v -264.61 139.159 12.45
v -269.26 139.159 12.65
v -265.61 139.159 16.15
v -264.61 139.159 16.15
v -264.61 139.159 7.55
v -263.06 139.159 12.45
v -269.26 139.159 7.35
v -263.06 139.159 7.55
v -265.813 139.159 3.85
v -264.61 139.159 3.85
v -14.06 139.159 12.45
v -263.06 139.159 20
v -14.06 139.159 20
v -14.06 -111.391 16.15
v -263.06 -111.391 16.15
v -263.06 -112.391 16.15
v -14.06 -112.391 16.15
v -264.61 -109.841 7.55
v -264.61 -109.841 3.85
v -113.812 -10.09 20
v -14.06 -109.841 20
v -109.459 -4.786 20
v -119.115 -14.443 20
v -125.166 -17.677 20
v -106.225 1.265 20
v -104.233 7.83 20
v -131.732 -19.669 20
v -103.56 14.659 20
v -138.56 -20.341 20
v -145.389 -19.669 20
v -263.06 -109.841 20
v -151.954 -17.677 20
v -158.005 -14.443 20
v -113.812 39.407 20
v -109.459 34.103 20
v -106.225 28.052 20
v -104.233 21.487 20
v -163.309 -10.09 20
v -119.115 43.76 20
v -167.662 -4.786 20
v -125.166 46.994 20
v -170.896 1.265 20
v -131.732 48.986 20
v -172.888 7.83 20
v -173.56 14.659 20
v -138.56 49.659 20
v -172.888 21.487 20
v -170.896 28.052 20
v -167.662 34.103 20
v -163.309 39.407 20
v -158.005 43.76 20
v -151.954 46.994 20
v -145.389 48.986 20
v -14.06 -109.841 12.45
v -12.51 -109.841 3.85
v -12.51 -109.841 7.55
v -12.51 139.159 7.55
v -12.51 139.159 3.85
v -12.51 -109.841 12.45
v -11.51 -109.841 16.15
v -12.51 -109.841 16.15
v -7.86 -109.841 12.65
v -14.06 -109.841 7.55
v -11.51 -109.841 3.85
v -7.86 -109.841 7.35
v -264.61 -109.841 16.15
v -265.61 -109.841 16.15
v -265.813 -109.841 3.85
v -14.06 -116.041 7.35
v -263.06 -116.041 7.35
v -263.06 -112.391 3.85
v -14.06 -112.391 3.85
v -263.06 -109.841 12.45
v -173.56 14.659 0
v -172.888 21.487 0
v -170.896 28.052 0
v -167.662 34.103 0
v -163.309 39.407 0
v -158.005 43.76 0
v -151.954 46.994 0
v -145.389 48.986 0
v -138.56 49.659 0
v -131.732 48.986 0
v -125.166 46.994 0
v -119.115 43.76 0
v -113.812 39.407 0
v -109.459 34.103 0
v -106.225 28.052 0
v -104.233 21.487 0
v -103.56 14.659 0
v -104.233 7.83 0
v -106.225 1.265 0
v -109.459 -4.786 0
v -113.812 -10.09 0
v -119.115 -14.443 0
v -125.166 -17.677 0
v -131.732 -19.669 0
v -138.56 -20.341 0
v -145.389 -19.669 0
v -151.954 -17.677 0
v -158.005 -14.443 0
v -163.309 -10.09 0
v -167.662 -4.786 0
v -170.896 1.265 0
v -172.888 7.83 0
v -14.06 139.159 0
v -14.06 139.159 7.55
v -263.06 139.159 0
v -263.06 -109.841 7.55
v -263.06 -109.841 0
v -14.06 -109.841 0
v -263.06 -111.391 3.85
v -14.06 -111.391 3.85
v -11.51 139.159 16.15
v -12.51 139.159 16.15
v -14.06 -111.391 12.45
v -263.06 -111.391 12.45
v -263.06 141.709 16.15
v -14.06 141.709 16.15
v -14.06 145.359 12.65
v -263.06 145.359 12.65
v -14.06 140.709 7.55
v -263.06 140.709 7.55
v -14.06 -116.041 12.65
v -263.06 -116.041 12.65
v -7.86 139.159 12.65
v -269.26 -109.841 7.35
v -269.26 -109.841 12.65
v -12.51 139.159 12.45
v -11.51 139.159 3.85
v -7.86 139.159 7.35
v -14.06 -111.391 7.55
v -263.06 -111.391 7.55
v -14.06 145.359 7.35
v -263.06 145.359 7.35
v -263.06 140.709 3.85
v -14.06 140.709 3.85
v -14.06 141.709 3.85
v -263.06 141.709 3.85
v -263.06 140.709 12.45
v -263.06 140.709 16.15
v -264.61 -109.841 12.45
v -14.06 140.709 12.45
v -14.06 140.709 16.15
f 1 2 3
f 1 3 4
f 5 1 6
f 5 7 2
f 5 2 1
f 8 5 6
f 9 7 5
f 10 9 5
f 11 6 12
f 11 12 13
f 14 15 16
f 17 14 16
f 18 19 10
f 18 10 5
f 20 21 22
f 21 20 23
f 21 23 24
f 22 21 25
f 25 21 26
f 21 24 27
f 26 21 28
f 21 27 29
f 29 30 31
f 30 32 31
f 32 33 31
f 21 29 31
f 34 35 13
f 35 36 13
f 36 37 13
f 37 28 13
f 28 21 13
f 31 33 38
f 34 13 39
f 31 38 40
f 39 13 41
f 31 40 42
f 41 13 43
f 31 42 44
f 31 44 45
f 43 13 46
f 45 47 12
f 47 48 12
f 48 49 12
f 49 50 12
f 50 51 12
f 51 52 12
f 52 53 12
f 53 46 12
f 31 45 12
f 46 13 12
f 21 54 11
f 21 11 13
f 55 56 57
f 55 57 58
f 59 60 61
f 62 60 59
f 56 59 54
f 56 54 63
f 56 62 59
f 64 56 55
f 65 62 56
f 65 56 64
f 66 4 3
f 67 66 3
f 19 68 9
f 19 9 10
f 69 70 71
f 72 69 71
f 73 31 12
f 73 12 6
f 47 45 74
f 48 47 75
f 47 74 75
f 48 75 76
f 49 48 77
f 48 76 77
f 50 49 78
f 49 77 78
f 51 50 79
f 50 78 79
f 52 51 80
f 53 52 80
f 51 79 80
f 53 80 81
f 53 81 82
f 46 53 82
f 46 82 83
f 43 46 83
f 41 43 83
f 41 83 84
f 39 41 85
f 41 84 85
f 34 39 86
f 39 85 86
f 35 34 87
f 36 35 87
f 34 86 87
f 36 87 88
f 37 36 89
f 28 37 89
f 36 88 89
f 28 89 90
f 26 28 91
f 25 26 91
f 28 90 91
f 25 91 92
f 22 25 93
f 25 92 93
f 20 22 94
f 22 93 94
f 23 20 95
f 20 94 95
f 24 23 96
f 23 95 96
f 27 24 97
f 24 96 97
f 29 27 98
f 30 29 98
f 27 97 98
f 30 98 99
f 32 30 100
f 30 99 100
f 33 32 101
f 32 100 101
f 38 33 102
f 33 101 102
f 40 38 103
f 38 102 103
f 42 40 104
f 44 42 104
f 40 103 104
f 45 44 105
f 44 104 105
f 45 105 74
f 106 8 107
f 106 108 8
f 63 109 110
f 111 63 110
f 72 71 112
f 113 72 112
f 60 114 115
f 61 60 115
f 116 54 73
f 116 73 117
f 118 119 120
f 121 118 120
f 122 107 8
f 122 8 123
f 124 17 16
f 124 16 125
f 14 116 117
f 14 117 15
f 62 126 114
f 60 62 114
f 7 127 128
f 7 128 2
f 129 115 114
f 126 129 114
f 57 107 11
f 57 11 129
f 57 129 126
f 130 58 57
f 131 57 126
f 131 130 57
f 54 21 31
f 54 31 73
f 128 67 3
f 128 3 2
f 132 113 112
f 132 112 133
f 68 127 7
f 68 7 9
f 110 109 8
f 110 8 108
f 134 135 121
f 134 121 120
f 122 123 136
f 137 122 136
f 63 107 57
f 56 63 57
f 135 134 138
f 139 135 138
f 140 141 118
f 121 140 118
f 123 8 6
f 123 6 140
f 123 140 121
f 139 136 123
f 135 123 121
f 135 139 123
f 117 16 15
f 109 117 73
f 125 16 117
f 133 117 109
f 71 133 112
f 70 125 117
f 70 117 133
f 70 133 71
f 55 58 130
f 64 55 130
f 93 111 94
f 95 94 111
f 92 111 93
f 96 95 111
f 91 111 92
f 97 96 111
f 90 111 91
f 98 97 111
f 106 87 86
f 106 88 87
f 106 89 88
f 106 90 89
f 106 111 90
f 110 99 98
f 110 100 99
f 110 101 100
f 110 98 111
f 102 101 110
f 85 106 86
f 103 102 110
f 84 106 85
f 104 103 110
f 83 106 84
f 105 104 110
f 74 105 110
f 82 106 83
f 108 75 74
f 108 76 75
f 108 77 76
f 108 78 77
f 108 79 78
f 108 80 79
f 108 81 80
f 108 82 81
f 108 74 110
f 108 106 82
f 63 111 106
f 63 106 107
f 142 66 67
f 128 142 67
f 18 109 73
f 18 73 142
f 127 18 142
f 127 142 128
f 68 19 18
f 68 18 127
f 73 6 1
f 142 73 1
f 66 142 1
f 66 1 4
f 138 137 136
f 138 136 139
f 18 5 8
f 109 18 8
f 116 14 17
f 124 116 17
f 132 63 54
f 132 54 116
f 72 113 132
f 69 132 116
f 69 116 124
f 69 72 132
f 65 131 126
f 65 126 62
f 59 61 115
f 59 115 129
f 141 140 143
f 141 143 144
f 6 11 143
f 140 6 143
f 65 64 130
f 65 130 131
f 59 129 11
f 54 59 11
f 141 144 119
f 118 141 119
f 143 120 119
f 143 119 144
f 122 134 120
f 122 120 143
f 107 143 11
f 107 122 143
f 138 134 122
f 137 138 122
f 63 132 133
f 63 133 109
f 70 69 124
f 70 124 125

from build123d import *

# Parameters (mm, degrees)
BOSS_EXTRU_3_DEPTH            = 20
ENL_V_MAT_EXTRU_11_DEPTH      = 295.374154069
ENL_V_MAT_EXTRU_11_DEPTH_BACK = 249
ENL_V_MAT_EXTRU_12_DEPTH      = 295.374154069
ENL_V_MAT_EXTRU_12_DEPTH_BACK = 249
ENL_V_MAT_EXTRU_13_DEPTH      = 372.52143865
ENL_V_MAT_EXTRU_13_DEPTH_BACK = 249
ENL_V_MAT_EXTRU_14_DEPTH      = 372.52143865
ENL_V_MAT_EXTRU_14_DEPTH_BACK = 249
ENL_V_MAT_EXTRU_15_DEPTH      = 295.374154069
ENL_V_MAT_EXTRU_15_DEPTH_BACK = 249
ENL_V_MAT_EXTRU_16_DEPTH      = 295.374154069
ENL_V_MAT_EXTRU_16_DEPTH_BACK = 249
ENL_V_MAT_EXTRU_17_DEPTH      = 372.52143865
ENL_V_MAT_EXTRU_17_DEPTH_BACK = 249
ENL_V_MAT_EXTRU_18_DEPTH      = 372.52143865
ENL_V_MAT_EXTRU_18_DEPTH_BACK = 249
ESQUISSE17_R                  = 35
ENL_V_MAT_EXTRU_20_DEPTH      = 20


with BuildPart() as part:
    # Esquisse1 → Boss.-Extru.3 (new body)
    with BuildSketch(Plane.XY):
        Polygon((-263.060356118, 145.358531169), (-14.060356118, 145.358531169), (-14.060356118, 139.158531169), (-7.860356118, 139.158531169), (-7.860356118, -109.841468831), (-14.060356118, -109.841468831), (-14.060356118, -116.041468831), (-263.060356118, -116.041468831), (-263.060356118, -109.841468831), (-269.260356118, -109.841468831), (-269.260356118, 139.158531169), (-263.060356118, 139.158531169), align=None)
    extrude(amount=BOSS_EXTRU_3_DEPTH)

    # Esquisse4 → Enlèv. mat.-Extru.11 (cut, two sides: drawn at the far end of the back side and taken through both)
    with BuildSketch(Plane(origin=(-14.060356118, 0, 0), x_dir=(0, 0, -1), z_dir=(1, 0, 0)).offset(-ENL_V_MAT_EXTRU_11_DEPTH_BACK)):
        Polygon((-553.411816833, 139.158531169), (-20, 139.158531169), (-12.45, 139.158531169), (-12.45, 140.708531169), (-16.15, 140.708531169), (-16.15, 141.708531169), (-12.65, 145.358531169), (356.535030531, 530.365777294), (-64.826371106, 1510.451097334), (-974.77321847, 1119.243851209), align=None)
    extrude(amount=ENL_V_MAT_EXTRU_11_DEPTH + ENL_V_MAT_EXTRU_11_DEPTH_BACK, mode=Mode.SUBTRACT)

    # Esquisse8 → Enlèv. mat.-Extru.12 (cut, two sides: drawn at the far end of the back side and taken through both)
    with BuildSketch(Plane(origin=(-14.060356118, 0, 0), x_dir=(0, 0, -1), z_dir=(1, 0, 0)).offset(-ENL_V_MAT_EXTRU_12_DEPTH_BACK)):
        Polygon((533.411816833, 139.158531169), (0, 139.158531169), (-7.55, 139.158531169), (-7.55, 140.708531169), (-3.85, 140.708531169), (-3.85, 141.708531169), (-7.35, 145.358531169), (-376.535030531, 530.365777294), (44.826371106, 1510.451097334), (954.77321847, 1119.243851209), align=None)
    extrude(amount=ENL_V_MAT_EXTRU_12_DEPTH + ENL_V_MAT_EXTRU_12_DEPTH_BACK, mode=Mode.SUBTRACT)

    # Esquisse10 → Enlèv. mat.-Extru.13 (cut, two sides: drawn at the far end of the back side and taken through both)
    with BuildSketch(Plane(origin=(0, 139.158531169, 0), x_dir=(1, 0, 0), z_dir=(0, 1, 0)).offset(-ENL_V_MAT_EXTRU_13_DEPTH_BACK)):
        Polygon((-263.060356118, -20), (-263.060356118, -12.45), (-264.610356118, -12.45), (-264.610356118, -16.15), (-265.610356118, -16.15), (-269.260356118, -12.65), (-269.260356118, -20), align=None)
    extrude(amount=ENL_V_MAT_EXTRU_13_DEPTH + ENL_V_MAT_EXTRU_13_DEPTH_BACK, mode=Mode.SUBTRACT)

    # Esquisse11 → Enlèv. mat.-Extru.14 (cut, two sides: drawn at the far end of the back side and taken through both)
    with BuildSketch(Plane(origin=(0, 139.158531169, 0), x_dir=(1, 0, 0), z_dir=(0, 1, 0)).offset(-ENL_V_MAT_EXTRU_14_DEPTH_BACK)):
        Polygon((-643.553156031, -387.393505759), (-269.260356118, -7.35), (-265.813317082, -3.85), (-264.610356118, -3.85), (-264.610356118, -7.55), (-263.060356118, -7.55), (-263.060356118, 0), (-263.060356118, 533.411816833), (-1249.023765439, 940.82907325), (-1629.516565352, 20.023750658), align=None)
    extrude(amount=ENL_V_MAT_EXTRU_14_DEPTH + ENL_V_MAT_EXTRU_14_DEPTH_BACK, mode=Mode.SUBTRACT)

    # Esquisse12 → Enlèv. mat.-Extru.15 (cut, two sides: drawn at the far end of the back side and taken through both)
    with BuildSketch(Plane.ZY.offset(263.060356118).offset(-ENL_V_MAT_EXTRU_15_DEPTH_BACK)):
        Polygon((20, -109.841468831), (12.45, -109.841468831), (12.45, -111.391468831), (16.15, -111.391468831), (16.15, -112.391468831), (12.65, -116.041468831), (20, -116.041468831), align=None)
    extrude(amount=ENL_V_MAT_EXTRU_15_DEPTH + ENL_V_MAT_EXTRU_15_DEPTH_BACK, mode=Mode.SUBTRACT)

    # Esquisse13 → Enlèv. mat.-Extru.16 (cut, two sides: drawn at the far end of the back side and taken through both)
    with BuildSketch(Plane.ZY.offset(263.060356118).offset(-ENL_V_MAT_EXTRU_16_DEPTH_BACK)):
        Polygon((376.535030531, -501.048714956), (7.35, -116.041468831), (3.85, -112.391468831), (3.85, -111.391468831), (7.55, -111.391468831), (7.55, -109.841468831), (0, -109.841468831), (-533.411816833, -109.841468831), (-954.77321847, -1089.92678887), (-44.826371106, -1481.134034995), align=None)
    extrude(amount=ENL_V_MAT_EXTRU_16_DEPTH + ENL_V_MAT_EXTRU_16_DEPTH_BACK, mode=Mode.SUBTRACT)

    # Esquisse15 → Enlèv. mat.-Extru.17 (cut, two sides: drawn at the far end of the back side and taken through both)
    with BuildSketch(Plane(origin=(0, 139.158531169, 0), x_dir=(1, 0, 0), z_dir=(0, 1, 0)).offset(-ENL_V_MAT_EXTRU_17_DEPTH_BACK)):
        Polygon((-14.060356118, 0), (-14.060356118, -7.55), (-12.510356118, -7.55), (-12.510356118, -3.85), (-11.510356118, -3.85), (-7.860356118, -7.35), (-7.860356118, 0), align=None)
    extrude(amount=ENL_V_MAT_EXTRU_17_DEPTH + ENL_V_MAT_EXTRU_17_DEPTH_BACK, mode=Mode.SUBTRACT)

    # Esquisse16 → Enlèv. mat.-Extru.18 (cut, two sides: drawn at the far end of the back side and taken through both)
    with BuildSketch(Plane(origin=(0, 139.158531169, 0), x_dir=(1, 0, 0), z_dir=(0, 1, 0)).offset(-ENL_V_MAT_EXTRU_18_DEPTH_BACK)):
        Polygon((377.146890007, 356.535030531), (-7.860356118, -12.65), (-11.510356118, -16.15), (-12.510356118, -16.15), (-12.510356118, -12.45), (-14.060356118, -12.45), (-14.060356118, -20), (-14.060356118, -553.411816833), (966.024963922, -974.77321847), (1357.232210047, -64.826371106), align=None)
    extrude(amount=ENL_V_MAT_EXTRU_18_DEPTH + ENL_V_MAT_EXTRU_18_DEPTH_BACK, mode=Mode.SUBTRACT)

    # Esquisse17 → Enlèv. mat.-Extru.20 (cut)
    with BuildSketch(Plane(origin=(0, 0, 0), x_dir=(-1, 0, 0), z_dir=(0, 0, -1))):
        with Locations((138.560356118, 14.658531169)):
            Circle(ESQUISSE17_R)
    extrude(amount=-ENL_V_MAT_EXTRU_20_DEPTH, mode=Mode.SUBTRACT)


solid = part.part
